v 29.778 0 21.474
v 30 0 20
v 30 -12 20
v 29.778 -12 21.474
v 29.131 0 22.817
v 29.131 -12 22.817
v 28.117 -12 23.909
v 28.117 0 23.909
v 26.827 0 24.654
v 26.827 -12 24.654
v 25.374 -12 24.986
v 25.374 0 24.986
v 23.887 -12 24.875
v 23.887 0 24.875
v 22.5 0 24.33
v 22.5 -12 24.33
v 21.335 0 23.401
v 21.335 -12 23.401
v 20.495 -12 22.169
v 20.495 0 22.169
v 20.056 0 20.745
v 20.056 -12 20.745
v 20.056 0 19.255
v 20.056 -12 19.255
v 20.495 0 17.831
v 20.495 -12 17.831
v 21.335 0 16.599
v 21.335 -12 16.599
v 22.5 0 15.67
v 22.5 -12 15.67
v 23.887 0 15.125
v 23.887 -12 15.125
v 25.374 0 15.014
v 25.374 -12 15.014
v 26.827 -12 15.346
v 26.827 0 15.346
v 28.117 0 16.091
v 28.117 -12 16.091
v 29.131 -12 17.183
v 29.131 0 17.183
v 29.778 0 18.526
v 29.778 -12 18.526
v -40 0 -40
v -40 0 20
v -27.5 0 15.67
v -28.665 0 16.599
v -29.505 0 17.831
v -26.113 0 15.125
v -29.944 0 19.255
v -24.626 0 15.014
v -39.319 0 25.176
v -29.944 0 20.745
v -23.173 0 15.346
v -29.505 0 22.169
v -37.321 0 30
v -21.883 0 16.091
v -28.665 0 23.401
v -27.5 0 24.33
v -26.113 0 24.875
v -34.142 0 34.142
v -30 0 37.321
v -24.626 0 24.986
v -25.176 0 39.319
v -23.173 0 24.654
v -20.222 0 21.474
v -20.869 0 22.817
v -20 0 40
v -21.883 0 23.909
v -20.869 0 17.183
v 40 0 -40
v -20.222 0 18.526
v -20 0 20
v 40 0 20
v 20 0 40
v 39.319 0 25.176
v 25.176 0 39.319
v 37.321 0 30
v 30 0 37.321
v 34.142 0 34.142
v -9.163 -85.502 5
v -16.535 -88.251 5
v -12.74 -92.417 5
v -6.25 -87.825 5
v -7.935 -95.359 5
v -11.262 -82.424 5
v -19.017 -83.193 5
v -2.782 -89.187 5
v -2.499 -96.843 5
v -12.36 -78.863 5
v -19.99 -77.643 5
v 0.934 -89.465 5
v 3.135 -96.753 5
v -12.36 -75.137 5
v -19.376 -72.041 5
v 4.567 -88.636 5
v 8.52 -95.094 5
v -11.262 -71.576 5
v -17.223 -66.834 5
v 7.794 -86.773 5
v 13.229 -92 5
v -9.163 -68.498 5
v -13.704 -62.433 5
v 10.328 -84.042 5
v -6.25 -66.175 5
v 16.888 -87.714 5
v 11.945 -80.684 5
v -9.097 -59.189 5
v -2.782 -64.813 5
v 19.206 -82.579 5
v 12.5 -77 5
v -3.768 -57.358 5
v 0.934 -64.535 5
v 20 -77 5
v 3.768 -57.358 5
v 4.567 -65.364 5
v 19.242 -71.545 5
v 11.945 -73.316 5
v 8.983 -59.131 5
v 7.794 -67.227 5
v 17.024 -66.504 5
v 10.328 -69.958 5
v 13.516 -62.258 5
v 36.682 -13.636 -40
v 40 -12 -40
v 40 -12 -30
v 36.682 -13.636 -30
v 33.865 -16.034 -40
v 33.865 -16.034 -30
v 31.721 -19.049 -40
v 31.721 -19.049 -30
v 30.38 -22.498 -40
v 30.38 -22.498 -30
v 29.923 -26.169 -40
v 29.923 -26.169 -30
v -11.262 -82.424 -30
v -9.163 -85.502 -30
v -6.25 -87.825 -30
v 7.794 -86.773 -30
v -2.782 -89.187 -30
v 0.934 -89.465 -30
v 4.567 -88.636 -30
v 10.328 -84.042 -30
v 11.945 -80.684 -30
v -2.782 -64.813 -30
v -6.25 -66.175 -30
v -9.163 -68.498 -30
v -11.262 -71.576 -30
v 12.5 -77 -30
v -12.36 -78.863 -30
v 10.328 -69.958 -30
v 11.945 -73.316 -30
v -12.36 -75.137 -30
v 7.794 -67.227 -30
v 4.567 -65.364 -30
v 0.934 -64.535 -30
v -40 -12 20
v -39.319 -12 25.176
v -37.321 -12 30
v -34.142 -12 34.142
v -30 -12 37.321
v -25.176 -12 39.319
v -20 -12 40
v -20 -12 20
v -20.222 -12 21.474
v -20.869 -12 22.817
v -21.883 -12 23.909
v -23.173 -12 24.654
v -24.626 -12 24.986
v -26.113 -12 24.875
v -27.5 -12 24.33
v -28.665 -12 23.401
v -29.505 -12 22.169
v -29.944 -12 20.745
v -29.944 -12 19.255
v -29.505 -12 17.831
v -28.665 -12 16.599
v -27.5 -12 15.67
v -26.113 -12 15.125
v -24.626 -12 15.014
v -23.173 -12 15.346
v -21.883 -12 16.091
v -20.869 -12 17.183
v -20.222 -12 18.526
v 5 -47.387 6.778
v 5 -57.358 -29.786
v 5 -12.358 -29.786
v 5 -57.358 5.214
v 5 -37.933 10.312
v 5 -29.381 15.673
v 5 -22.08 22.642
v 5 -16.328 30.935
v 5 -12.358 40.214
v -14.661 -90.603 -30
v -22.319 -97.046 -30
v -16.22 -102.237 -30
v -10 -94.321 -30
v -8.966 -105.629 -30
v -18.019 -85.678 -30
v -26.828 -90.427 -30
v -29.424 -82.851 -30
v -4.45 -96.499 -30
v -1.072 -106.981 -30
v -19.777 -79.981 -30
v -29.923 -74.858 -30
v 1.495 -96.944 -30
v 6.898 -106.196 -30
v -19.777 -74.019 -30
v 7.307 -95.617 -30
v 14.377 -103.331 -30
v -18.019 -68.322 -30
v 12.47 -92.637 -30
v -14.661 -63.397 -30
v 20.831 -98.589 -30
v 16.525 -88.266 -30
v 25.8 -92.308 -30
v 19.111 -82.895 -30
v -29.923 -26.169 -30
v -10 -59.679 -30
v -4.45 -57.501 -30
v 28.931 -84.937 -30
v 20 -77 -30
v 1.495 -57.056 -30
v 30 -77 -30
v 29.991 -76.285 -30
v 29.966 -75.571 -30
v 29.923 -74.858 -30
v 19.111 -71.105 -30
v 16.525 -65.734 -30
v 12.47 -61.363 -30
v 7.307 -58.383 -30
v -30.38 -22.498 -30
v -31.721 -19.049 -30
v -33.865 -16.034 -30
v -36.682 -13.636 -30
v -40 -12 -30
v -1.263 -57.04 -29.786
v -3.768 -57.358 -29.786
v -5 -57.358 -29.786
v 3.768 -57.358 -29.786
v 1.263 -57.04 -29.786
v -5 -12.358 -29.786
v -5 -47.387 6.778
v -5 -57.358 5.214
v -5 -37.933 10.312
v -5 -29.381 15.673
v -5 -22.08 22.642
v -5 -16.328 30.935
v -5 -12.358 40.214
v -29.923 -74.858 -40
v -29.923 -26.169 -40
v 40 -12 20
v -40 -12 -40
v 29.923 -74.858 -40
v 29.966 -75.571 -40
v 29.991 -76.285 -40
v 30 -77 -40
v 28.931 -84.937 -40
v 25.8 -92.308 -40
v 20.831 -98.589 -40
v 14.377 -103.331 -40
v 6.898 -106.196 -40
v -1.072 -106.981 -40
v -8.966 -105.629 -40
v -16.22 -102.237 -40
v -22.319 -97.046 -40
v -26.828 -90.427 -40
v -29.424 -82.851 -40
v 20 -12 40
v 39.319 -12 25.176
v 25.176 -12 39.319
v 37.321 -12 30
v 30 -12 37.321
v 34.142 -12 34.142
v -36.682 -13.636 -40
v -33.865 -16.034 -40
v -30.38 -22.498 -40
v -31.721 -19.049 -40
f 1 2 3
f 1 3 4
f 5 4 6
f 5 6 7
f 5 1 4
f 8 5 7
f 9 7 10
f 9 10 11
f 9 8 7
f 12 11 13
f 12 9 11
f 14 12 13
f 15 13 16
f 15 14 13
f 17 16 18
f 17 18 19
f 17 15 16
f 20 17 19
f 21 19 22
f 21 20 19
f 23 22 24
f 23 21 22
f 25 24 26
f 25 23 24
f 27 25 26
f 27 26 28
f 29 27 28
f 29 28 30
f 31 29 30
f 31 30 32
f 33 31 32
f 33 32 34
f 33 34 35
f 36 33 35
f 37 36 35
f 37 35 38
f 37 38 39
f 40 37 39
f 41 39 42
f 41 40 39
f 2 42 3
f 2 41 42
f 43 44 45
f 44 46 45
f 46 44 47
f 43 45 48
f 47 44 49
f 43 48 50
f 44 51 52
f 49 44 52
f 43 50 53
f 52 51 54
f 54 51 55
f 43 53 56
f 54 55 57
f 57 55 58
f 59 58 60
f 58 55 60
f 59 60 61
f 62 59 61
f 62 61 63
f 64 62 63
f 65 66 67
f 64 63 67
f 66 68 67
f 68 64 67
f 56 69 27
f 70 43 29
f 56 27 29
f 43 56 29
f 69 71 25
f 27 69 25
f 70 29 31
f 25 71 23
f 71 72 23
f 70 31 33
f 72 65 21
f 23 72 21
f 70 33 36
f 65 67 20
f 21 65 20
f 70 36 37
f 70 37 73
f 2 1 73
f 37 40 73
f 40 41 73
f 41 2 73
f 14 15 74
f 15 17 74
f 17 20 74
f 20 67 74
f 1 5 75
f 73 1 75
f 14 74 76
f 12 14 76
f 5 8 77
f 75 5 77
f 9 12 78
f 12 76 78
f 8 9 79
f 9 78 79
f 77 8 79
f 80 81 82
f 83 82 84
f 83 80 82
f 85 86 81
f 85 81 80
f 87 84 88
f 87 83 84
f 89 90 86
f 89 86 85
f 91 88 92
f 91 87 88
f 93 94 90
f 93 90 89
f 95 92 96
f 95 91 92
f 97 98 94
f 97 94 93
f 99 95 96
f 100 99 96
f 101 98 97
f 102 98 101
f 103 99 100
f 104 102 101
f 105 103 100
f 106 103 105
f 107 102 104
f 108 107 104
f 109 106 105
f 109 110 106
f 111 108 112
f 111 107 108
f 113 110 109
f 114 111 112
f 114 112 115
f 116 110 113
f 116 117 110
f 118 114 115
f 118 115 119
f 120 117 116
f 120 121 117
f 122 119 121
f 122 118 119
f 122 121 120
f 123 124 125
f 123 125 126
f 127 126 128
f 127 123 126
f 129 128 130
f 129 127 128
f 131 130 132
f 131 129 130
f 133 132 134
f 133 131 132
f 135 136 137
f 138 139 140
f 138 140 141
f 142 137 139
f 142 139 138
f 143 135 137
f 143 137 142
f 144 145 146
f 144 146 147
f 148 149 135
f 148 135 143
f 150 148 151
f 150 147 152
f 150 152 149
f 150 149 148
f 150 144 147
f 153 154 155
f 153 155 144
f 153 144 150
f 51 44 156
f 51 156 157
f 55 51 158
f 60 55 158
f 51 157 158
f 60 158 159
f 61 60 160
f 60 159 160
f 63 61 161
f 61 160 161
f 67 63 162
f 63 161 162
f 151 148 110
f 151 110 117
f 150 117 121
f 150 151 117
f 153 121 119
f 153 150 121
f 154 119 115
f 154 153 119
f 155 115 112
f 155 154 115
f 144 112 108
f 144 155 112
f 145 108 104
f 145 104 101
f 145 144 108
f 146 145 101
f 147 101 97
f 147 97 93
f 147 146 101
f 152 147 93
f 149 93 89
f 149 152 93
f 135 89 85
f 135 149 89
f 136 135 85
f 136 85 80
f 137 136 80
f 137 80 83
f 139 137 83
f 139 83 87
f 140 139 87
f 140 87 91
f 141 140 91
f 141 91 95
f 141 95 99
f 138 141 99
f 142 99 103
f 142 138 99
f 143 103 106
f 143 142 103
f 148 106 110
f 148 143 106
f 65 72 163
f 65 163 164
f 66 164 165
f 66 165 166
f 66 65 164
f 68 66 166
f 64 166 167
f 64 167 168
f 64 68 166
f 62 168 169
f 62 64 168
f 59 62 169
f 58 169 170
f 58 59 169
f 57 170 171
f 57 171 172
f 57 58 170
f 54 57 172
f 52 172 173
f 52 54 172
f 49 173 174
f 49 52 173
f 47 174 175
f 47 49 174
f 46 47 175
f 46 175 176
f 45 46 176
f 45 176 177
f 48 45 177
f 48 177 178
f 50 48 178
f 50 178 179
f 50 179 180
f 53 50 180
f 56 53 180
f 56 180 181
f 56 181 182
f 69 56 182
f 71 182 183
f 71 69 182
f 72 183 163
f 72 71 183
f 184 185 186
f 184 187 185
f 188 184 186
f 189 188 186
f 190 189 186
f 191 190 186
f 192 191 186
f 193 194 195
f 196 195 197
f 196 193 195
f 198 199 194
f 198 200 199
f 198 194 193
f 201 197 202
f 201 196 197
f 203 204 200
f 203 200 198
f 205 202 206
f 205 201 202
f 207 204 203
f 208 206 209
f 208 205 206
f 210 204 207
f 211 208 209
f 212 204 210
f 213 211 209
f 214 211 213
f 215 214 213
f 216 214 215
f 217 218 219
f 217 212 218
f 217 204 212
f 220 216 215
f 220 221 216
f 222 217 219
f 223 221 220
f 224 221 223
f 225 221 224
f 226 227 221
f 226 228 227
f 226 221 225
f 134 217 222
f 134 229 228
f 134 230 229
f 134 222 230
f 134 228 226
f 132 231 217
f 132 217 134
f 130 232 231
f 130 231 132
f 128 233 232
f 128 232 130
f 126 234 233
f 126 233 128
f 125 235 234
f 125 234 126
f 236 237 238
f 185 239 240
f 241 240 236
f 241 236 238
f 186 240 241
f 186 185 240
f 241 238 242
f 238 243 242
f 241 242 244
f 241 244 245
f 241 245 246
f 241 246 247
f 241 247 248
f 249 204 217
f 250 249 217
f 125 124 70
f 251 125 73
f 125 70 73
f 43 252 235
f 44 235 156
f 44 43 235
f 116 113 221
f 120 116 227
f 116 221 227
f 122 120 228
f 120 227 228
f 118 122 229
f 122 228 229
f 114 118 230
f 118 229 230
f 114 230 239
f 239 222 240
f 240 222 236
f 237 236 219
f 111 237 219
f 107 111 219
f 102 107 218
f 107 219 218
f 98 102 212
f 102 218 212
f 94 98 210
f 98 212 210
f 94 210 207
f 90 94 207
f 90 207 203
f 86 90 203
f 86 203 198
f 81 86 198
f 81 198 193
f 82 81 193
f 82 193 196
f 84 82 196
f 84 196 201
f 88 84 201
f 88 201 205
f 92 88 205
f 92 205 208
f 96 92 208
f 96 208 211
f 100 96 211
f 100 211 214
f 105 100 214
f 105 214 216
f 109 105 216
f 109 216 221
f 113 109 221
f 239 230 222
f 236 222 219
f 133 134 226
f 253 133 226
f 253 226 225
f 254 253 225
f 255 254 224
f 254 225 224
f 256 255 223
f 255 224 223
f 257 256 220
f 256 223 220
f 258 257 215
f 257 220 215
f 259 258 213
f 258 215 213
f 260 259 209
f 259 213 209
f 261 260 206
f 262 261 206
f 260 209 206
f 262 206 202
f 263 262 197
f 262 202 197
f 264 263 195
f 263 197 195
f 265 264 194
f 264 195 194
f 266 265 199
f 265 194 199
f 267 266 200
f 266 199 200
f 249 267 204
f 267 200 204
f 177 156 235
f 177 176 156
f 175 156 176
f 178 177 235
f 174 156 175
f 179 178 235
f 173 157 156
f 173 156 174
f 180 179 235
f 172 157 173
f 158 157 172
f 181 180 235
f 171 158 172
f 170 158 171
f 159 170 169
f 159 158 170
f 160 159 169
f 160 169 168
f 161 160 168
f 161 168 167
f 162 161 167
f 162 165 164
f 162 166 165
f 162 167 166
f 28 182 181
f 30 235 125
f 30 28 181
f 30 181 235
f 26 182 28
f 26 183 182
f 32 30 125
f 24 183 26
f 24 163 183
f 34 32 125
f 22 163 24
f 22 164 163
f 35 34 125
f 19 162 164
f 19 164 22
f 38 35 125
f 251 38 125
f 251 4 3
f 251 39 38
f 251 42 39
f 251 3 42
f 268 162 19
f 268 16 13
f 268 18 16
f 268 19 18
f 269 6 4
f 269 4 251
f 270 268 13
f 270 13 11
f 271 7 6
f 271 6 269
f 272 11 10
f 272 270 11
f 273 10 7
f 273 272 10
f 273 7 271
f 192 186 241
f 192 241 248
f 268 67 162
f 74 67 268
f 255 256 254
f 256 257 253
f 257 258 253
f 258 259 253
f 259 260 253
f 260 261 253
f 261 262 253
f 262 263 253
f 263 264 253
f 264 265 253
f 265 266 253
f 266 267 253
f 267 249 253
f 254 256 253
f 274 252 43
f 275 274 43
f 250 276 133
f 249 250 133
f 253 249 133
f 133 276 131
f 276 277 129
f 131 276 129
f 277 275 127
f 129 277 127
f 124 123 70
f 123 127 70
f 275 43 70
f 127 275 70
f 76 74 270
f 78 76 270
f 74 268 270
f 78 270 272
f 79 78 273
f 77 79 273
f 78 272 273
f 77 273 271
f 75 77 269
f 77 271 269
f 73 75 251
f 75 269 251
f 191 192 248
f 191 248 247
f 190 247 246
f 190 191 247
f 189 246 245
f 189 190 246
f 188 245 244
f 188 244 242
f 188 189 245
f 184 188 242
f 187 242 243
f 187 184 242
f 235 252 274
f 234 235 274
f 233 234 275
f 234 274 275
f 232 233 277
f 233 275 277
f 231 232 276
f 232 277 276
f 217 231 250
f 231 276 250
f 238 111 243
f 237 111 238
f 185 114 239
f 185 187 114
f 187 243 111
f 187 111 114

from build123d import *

# Parameters (mm, degrees)
F0_W        = 80
F0_H        = 80
F0_R        = 5
F1_DEPTH    = 12
F2_R        = 20
F3_W        = 80
F3_H        = 10
F4_DEPTH    = 95
F6_DEPTH    = 25
F7_T1_DEPTH = 10
F8_R        = 20
F8_R_2      = 12.5
F9_DEPTH    = 35
F11_DEPTH   = 5


# Not quite as in the source:
# - a fillet or chamfer that OpenCascade refuses, or shapes differently, is made with other operations: its cross-section is extruded or revolved along the edge and cut away or added


with BuildPart() as f1:
    # F0 (on Front) → F1 (new body)
    with BuildSketch(Plane.XZ):
        Rectangle(F0_W, F0_H)
        with Locations((-25, 20)):
            Circle(F0_R, mode=Mode.SUBTRACT)
        with Locations((25, 20)):
            Circle(F0_R, mode=Mode.SUBTRACT)
    extrude(amount=F1_DEPTH)

    # F2
    f2_edges = [f1.edges().sort_by_distance(p)[0] for p in [
        (40, -6, 40),
        (-40, -6, 40),
    ]]
    fillet(f2_edges, radius=F2_R)

    # F3 (on face) → F4 (join)
    with BuildSketch(Plane.XZ.offset(12)):
        with Locations((0, -35)):
            Rectangle(F3_W, F3_H)
    extrude(amount=F4_DEPTH)

    # F5 (on face) → F6 (cut)
    with BuildSketch(Plane.XY.offset(-30)):
        with BuildLine():
            Line((-40, -107), (0, -107))
            ThreePointArc((0, -107), (-21.9575829196, -97.4417355508), (-29.9234068918, -74.857636822))
            Line((-29.9234068918, -74.857636822), (-29.9234068918, -12))
            Line((-29.9234068918, -12), (-40, -12))
            Line((-40, -12), (-40, -107))
        make_face()
        with BuildLine():
            ThreePointArc((29.9234068918, -74.857636822), (29.9808456081, -75.9281340463), (30, -77))
            ThreePointArc((30, -77), (21.2132034356, -98.2132034356), (0, -107))
            Line((0, -107), (40, -107))
            Line((40, -107), (40, -12))
            Line((40, -12), (29.9234068918, -12))
            Line((29.9234068918, -12), (29.9234068918, -74.857636822))
        make_face()
    extrude(amount=-F6_DEPTH, mode=Mode.SUBTRACT)

    # F7: fillet of radius 15 on 2 edges, made by hand

    # F7_s2 → F7_t1 (join)
    with BuildSketch(Plane.XY.offset(-40)):
        with BuildLine():
            ThreePointArc((-40, -12), (-32.6994324281, -17.4756259202), (-29.9234068918, -26.1689824821))
            Line((-29.9234068918, -26.1689824821), (-29.9234068918, -12))
            Line((-29.9234068918, -12), (-40, -12))
        make_face()
        with BuildLine():
            ThreePointArc((40, -12), (32.6994324281, -17.4756259202), (29.9234068918, -26.1689824821))
            Line((29.9234068918, -26.1689824821), (29.9234068918, -12))
            Line((29.9234068918, -12), (40, -12))
        make_face()
    extrude(amount=F7_T1_DEPTH)

    # F8 (on face) → F9 (join)
    with BuildSketch(Plane.XY.offset(-30)):
        with Locations((0, -77)):
            Circle(F8_R)
        with Locations((0, -77)):
            Circle(F8_R_2, mode=Mode.SUBTRACT)
    extrude(amount=F9_DEPTH)

    # F10 (on Right) → F11 (join, symmetric)
    with BuildSketch(Plane.YZ):
        with BuildLine():
            Line((-57.3581678378, -29.785791263), (-12.3581678378, -29.785791263))
            Line((-12.3581678378, -29.785791263), (-12.3581678378, 40.214208737))
            ThreePointArc((-12.3581678378, 40.214208737), (-29.3813213863, 15.6725490137), (-57.3581678378, 5.214208737))
            Line((-57.3581678378, 5.214208737), (-57.3581678378, -29.785791263))
        make_face()
    extrude(amount=F11_DEPTH, both=True)


solid = f1.part
